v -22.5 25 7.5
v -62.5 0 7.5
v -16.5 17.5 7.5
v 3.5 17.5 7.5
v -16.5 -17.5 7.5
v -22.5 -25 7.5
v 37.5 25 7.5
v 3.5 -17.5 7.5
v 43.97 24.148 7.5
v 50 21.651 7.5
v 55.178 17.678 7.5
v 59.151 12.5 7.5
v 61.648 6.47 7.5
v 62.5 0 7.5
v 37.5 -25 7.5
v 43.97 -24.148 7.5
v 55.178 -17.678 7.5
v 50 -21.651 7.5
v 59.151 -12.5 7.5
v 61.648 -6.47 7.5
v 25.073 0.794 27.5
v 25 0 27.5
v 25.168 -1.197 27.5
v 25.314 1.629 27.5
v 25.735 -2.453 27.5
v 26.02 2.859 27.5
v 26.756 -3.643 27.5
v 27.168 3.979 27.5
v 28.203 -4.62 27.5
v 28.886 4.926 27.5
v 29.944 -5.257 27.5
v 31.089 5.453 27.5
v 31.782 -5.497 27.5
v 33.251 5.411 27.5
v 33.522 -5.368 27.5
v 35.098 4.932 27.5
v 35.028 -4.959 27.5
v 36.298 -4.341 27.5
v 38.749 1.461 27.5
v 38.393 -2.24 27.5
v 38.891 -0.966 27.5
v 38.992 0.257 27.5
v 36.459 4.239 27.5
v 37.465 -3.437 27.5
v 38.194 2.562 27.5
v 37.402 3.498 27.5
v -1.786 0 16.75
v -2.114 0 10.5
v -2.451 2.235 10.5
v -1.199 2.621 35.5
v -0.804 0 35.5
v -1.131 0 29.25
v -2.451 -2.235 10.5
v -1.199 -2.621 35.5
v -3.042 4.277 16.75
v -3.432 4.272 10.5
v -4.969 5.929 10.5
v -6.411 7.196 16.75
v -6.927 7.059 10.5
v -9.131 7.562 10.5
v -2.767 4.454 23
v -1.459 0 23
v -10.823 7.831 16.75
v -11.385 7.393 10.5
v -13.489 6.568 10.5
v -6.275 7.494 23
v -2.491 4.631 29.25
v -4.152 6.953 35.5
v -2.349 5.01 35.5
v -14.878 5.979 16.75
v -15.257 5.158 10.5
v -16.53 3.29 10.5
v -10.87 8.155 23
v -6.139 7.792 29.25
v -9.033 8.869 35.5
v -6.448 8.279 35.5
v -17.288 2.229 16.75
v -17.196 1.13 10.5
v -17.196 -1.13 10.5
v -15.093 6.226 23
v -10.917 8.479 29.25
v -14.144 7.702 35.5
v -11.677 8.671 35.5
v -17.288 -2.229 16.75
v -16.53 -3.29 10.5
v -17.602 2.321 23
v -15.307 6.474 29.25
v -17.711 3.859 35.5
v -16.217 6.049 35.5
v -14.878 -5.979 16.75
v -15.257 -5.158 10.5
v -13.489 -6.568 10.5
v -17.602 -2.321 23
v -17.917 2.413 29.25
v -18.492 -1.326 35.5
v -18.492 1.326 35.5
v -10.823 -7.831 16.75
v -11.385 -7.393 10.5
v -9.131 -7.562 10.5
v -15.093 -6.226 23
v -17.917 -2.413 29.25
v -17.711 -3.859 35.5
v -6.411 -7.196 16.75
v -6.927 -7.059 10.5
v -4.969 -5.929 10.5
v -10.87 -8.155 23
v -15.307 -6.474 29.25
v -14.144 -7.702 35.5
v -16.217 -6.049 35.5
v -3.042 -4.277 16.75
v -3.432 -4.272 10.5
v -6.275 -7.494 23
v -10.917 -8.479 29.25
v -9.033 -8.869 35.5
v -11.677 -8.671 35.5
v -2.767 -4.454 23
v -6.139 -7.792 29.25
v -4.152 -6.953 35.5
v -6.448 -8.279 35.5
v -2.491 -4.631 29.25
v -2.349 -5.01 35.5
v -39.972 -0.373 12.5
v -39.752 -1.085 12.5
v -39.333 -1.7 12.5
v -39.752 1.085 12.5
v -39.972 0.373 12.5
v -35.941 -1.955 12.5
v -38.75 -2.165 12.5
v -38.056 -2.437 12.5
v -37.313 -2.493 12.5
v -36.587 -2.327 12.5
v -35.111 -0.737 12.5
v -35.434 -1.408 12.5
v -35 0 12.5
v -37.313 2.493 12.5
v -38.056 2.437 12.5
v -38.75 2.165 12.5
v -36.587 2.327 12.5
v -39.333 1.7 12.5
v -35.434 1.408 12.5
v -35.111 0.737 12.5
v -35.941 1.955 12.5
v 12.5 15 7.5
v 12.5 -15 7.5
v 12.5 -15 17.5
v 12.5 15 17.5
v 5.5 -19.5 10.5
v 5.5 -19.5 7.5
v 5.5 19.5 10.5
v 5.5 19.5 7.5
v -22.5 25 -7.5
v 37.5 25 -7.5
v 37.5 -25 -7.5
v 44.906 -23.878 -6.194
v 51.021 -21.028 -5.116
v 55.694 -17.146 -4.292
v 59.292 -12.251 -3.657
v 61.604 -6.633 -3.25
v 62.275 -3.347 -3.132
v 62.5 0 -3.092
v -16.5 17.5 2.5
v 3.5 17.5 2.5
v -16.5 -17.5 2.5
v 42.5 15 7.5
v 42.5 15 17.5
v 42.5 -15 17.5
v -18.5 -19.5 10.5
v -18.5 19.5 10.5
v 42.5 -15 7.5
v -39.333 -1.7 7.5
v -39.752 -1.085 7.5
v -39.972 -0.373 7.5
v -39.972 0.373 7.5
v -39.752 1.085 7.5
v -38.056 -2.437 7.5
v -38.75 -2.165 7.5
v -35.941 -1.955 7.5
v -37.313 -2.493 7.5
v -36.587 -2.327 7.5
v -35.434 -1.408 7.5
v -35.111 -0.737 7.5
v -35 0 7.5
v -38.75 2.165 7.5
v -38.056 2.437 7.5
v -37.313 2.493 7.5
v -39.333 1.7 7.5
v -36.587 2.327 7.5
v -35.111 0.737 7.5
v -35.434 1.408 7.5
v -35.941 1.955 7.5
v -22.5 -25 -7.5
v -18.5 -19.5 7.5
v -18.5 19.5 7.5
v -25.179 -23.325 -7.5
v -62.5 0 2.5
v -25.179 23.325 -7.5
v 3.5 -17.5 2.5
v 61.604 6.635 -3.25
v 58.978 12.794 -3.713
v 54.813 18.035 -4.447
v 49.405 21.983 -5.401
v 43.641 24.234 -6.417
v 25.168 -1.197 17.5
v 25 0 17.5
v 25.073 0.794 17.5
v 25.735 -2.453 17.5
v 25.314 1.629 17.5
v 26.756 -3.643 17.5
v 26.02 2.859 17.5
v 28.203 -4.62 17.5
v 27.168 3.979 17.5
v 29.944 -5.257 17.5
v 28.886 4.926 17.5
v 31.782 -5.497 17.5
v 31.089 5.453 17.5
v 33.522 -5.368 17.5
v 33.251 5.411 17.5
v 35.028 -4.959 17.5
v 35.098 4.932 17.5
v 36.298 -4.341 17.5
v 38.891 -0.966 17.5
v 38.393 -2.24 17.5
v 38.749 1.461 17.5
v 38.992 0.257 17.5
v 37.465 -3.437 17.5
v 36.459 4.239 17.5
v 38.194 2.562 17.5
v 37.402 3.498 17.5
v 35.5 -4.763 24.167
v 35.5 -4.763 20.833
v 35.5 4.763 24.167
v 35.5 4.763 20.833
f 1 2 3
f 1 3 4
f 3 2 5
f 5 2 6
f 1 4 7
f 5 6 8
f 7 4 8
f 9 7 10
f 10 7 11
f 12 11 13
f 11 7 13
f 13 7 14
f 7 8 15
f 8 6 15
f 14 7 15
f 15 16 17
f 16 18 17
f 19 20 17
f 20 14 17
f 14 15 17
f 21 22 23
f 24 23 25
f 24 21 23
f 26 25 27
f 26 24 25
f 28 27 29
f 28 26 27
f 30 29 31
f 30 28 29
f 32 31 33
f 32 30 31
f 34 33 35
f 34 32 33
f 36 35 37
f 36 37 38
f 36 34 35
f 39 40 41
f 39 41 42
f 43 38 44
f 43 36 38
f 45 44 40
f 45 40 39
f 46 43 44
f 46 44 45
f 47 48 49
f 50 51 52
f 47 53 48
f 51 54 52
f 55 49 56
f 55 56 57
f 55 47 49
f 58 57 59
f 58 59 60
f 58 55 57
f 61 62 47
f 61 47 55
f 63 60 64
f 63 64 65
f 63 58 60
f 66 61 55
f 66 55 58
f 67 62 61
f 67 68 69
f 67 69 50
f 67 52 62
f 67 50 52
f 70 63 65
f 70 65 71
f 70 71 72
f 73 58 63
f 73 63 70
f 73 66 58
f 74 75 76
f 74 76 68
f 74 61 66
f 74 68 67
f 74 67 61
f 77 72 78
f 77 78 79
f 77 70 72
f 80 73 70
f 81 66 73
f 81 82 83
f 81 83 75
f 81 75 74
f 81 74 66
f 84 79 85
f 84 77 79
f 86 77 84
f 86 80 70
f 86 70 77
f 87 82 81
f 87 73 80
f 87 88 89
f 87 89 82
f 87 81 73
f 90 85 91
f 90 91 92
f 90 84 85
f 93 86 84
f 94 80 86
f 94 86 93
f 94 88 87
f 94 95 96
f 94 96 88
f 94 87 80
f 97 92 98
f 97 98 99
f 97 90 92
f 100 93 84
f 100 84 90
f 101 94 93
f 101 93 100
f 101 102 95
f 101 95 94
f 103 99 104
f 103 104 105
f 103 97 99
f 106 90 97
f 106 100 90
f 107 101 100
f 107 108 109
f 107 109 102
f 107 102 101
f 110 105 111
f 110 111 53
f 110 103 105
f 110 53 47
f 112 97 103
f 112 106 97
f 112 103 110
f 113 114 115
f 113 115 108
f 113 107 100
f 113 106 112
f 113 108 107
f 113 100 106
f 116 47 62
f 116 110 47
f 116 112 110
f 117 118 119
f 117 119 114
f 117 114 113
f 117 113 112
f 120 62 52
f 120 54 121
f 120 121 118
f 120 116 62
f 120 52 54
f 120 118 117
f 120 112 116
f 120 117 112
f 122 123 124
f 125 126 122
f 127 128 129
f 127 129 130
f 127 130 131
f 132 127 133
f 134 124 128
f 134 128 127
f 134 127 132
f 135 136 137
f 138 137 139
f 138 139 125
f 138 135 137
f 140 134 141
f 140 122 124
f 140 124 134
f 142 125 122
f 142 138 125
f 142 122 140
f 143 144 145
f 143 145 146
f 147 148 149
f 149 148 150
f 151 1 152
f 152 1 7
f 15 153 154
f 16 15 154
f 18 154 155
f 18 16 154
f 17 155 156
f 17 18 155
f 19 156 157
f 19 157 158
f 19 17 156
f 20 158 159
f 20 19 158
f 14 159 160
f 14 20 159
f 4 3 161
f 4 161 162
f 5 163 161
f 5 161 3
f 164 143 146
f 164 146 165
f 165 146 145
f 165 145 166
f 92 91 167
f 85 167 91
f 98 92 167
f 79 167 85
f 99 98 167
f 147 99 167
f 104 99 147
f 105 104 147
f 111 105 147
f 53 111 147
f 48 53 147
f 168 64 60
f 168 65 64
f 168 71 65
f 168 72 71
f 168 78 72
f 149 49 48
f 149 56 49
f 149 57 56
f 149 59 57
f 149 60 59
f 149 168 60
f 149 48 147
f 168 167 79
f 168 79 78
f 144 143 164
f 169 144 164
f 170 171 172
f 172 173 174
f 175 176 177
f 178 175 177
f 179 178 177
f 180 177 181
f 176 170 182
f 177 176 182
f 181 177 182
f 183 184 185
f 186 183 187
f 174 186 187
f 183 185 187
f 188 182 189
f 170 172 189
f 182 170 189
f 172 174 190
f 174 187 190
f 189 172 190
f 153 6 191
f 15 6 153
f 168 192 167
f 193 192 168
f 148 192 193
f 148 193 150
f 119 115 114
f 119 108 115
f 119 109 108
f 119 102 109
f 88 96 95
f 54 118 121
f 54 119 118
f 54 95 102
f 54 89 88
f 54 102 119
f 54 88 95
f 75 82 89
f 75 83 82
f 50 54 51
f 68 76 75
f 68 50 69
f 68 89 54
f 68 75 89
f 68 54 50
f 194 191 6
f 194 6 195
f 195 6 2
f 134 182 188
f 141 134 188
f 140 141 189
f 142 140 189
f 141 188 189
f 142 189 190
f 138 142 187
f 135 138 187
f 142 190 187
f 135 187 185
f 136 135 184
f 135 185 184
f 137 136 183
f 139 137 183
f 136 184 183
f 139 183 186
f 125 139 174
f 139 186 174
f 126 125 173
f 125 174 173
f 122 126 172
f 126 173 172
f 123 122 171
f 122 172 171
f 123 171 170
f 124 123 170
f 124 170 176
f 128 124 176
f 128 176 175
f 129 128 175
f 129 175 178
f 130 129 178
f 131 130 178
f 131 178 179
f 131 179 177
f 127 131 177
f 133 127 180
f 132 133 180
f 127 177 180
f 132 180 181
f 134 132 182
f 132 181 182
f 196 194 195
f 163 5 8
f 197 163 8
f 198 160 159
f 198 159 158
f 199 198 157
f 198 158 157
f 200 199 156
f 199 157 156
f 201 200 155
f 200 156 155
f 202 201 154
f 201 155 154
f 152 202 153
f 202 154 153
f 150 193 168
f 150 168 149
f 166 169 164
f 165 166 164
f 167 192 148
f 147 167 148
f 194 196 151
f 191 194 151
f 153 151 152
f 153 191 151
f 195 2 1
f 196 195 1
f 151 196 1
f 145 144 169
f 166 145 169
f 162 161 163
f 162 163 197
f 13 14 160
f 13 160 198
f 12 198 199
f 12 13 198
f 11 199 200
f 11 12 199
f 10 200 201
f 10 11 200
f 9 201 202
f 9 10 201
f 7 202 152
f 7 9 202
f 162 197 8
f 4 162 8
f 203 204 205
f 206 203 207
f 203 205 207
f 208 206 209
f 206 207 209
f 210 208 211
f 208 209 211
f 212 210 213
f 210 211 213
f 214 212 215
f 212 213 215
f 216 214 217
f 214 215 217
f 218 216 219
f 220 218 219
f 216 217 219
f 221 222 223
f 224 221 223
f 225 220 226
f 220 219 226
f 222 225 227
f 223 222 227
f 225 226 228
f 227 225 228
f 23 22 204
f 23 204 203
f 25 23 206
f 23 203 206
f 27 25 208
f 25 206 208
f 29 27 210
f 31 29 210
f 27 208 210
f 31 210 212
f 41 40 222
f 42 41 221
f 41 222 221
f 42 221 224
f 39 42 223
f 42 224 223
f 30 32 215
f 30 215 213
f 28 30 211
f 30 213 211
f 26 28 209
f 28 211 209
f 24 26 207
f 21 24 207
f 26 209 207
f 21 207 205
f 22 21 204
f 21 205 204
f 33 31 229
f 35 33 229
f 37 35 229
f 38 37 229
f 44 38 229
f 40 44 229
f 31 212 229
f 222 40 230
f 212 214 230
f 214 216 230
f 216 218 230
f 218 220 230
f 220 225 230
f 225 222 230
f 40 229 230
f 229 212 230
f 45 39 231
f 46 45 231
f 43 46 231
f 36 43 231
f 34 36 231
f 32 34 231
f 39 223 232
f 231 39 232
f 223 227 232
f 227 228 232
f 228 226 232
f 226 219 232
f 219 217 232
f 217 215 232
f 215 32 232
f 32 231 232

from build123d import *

# Parameters (mm, degrees)
F0_W      = 125
F0_H      = 15
F1_DEPTH  = 25
F2_R      = 24.99999
F4_DEPTH  = 50.001
F6_DEPTH  = 25
F8_DEPTH  = 50.001
F9_W      = 30
F9_H      = 30
F10_DEPTH = 10
F11_W     = 20
F11_H     = 5
F12_DEPTH = 17.5
F14_DEPTH = 10
F15_R     = 2.5
F16_DEPTH = 5
F21_DEPTH = 25
F18_W     = 24
F18_H     = 39
F18_W_2   = 20
F18_H_2   = 35
F19_DEPTH = 3
F20_R     = 7.5835339327
F22_DEPTH = 25
F22_TAPER = -3


# Not quite as in the source:
# - a fillet or chamfer is up to 0.001 mm smaller than in the source, because OpenCascade refuses the exact size


with BuildPart() as f1:
    # F0 (on Front) → F1 (new body, symmetric)
    with BuildSketch(Plane.XZ):
        Rectangle(F0_W, F0_H)
    extrude(amount=F1_DEPTH, both=True)

    # F2 (radius 25 in the source; OpenCascade refuses exactly that, so slightly less here)
    f2_edges = [f1.edges().sort_by_distance(p)[0] for p in [
        (62.5, -25, 0),
        (62.5, 25, 0),
    ]]
    fillet(f2_edges, radius=F2_R)

    # F3 (on face) → F4 (cut, through all)
    with BuildSketch(Plane.XZ.offset(25)):
        Polygon((-25.1794919243, -7.5), (-62.5, 2.5), (-62.5, -7.5), align=None)
    extrude(amount=-F4_DEPTH, mode=Mode.SUBTRACT)

    # F5 (on face) → F6 (cut)
    with BuildSketch(Plane.XY.offset(7.5)):
        Polygon((-22.5, -25), (-62.5, 0), (-62.5, -25), align=None)
        Polygon((-62.5, 25), (-62.5, 0), (-22.5, 25), align=None)
    extrude(amount=-F6_DEPTH, mode=Mode.SUBTRACT)

    # F7 (on face) → F8 (cut, through all)
    with BuildSketch(Plane.XZ.offset(25)):
        Polygon((96.8128483375, 2.9584554646), (37.5, -7.5), (96.8128483375, -7.5), align=None)
    extrude(amount=-F8_DEPTH, mode=Mode.SUBTRACT)

    # F11 (on Front) → F12 (cut, symmetric)
    with BuildSketch(Plane.XZ):
        with Locations((-6.5, 5)):
            Rectangle(F11_W, F11_H)
    extrude(amount=F12_DEPTH, both=True, mode=Mode.SUBTRACT)


with BuildPart() as f10:
    # F9 (on face) → F10 (new body)
    with BuildSketch(Plane.XY.offset(7.5)):
        with Locations((27.5, 0)):
            Rectangle(F9_W, F9_H)
    extrude(amount=F10_DEPTH)


with BuildPart() as f14:
    # F13 (on face) → F14 (new body)
    with BuildSketch(Plane.XY.offset(17.5)):
        with BuildLine():
            add(Edge.make_bspline(
                [(25, 0), (25, -9.5262794416), (35.5, -4.7631397208), (46, 0), (35.5, 4.7631397208), (25, 9.5262794416), (25, 0)],
                knots=[0, 0, 0, 2.0943951024, 2.0943951024, 4.1887902048, 4.1887902048, 6.2831853072, 6.2831853072, 6.2831853072], degree=2, weights=[1, 0.5, 1, 0.5, 1, 0.5, 1]))
        make_face()
    extrude(amount=F14_DEPTH)


with BuildPart() as f16:
    # F15 (on face) → F16 (new body)
    with BuildSketch(Plane.XY.offset(7.5)):
        with Locations((-37.5, 0)):
            Circle(F15_R)
    extrude(amount=F16_DEPTH)


with BuildPart() as f21:
    # F21 (new): a face of the model
    f21_faces = [f1.part.faces().sort_by_distance(p)[0] for p in [
        (8.9797168321, 0, 7.5),
    ]]
    extrude(f21_faces, amount=F21_DEPTH)


with BuildPart() as f19:
    # F18 (on face) → F19 (new body)
    with BuildSketch(Plane.XY.offset(7.5)):
        with Locations((-6.5, 0)):
            Rectangle(F18_W, F18_H)
        with Locations((-6.5, 0)):
            Rectangle(F18_W_2, F18_H_2, mode=Mode.SUBTRACT)
        with Locations((-6.5, 0)):
            Rectangle(F18_W_2, F18_H_2)
    extrude(amount=F19_DEPTH)

    # F20 (on face) → F22 (join)
    with BuildSketch(Plane.XY.offset(10.5)):
        with Locations((-9.6975341439, 0)):
            Circle(F20_R)
    extrude(amount=F22_DEPTH, taper=F22_TAPER)


solid = Compound([f1.part, f10.part, f14.part, f16.part, f19.part])
